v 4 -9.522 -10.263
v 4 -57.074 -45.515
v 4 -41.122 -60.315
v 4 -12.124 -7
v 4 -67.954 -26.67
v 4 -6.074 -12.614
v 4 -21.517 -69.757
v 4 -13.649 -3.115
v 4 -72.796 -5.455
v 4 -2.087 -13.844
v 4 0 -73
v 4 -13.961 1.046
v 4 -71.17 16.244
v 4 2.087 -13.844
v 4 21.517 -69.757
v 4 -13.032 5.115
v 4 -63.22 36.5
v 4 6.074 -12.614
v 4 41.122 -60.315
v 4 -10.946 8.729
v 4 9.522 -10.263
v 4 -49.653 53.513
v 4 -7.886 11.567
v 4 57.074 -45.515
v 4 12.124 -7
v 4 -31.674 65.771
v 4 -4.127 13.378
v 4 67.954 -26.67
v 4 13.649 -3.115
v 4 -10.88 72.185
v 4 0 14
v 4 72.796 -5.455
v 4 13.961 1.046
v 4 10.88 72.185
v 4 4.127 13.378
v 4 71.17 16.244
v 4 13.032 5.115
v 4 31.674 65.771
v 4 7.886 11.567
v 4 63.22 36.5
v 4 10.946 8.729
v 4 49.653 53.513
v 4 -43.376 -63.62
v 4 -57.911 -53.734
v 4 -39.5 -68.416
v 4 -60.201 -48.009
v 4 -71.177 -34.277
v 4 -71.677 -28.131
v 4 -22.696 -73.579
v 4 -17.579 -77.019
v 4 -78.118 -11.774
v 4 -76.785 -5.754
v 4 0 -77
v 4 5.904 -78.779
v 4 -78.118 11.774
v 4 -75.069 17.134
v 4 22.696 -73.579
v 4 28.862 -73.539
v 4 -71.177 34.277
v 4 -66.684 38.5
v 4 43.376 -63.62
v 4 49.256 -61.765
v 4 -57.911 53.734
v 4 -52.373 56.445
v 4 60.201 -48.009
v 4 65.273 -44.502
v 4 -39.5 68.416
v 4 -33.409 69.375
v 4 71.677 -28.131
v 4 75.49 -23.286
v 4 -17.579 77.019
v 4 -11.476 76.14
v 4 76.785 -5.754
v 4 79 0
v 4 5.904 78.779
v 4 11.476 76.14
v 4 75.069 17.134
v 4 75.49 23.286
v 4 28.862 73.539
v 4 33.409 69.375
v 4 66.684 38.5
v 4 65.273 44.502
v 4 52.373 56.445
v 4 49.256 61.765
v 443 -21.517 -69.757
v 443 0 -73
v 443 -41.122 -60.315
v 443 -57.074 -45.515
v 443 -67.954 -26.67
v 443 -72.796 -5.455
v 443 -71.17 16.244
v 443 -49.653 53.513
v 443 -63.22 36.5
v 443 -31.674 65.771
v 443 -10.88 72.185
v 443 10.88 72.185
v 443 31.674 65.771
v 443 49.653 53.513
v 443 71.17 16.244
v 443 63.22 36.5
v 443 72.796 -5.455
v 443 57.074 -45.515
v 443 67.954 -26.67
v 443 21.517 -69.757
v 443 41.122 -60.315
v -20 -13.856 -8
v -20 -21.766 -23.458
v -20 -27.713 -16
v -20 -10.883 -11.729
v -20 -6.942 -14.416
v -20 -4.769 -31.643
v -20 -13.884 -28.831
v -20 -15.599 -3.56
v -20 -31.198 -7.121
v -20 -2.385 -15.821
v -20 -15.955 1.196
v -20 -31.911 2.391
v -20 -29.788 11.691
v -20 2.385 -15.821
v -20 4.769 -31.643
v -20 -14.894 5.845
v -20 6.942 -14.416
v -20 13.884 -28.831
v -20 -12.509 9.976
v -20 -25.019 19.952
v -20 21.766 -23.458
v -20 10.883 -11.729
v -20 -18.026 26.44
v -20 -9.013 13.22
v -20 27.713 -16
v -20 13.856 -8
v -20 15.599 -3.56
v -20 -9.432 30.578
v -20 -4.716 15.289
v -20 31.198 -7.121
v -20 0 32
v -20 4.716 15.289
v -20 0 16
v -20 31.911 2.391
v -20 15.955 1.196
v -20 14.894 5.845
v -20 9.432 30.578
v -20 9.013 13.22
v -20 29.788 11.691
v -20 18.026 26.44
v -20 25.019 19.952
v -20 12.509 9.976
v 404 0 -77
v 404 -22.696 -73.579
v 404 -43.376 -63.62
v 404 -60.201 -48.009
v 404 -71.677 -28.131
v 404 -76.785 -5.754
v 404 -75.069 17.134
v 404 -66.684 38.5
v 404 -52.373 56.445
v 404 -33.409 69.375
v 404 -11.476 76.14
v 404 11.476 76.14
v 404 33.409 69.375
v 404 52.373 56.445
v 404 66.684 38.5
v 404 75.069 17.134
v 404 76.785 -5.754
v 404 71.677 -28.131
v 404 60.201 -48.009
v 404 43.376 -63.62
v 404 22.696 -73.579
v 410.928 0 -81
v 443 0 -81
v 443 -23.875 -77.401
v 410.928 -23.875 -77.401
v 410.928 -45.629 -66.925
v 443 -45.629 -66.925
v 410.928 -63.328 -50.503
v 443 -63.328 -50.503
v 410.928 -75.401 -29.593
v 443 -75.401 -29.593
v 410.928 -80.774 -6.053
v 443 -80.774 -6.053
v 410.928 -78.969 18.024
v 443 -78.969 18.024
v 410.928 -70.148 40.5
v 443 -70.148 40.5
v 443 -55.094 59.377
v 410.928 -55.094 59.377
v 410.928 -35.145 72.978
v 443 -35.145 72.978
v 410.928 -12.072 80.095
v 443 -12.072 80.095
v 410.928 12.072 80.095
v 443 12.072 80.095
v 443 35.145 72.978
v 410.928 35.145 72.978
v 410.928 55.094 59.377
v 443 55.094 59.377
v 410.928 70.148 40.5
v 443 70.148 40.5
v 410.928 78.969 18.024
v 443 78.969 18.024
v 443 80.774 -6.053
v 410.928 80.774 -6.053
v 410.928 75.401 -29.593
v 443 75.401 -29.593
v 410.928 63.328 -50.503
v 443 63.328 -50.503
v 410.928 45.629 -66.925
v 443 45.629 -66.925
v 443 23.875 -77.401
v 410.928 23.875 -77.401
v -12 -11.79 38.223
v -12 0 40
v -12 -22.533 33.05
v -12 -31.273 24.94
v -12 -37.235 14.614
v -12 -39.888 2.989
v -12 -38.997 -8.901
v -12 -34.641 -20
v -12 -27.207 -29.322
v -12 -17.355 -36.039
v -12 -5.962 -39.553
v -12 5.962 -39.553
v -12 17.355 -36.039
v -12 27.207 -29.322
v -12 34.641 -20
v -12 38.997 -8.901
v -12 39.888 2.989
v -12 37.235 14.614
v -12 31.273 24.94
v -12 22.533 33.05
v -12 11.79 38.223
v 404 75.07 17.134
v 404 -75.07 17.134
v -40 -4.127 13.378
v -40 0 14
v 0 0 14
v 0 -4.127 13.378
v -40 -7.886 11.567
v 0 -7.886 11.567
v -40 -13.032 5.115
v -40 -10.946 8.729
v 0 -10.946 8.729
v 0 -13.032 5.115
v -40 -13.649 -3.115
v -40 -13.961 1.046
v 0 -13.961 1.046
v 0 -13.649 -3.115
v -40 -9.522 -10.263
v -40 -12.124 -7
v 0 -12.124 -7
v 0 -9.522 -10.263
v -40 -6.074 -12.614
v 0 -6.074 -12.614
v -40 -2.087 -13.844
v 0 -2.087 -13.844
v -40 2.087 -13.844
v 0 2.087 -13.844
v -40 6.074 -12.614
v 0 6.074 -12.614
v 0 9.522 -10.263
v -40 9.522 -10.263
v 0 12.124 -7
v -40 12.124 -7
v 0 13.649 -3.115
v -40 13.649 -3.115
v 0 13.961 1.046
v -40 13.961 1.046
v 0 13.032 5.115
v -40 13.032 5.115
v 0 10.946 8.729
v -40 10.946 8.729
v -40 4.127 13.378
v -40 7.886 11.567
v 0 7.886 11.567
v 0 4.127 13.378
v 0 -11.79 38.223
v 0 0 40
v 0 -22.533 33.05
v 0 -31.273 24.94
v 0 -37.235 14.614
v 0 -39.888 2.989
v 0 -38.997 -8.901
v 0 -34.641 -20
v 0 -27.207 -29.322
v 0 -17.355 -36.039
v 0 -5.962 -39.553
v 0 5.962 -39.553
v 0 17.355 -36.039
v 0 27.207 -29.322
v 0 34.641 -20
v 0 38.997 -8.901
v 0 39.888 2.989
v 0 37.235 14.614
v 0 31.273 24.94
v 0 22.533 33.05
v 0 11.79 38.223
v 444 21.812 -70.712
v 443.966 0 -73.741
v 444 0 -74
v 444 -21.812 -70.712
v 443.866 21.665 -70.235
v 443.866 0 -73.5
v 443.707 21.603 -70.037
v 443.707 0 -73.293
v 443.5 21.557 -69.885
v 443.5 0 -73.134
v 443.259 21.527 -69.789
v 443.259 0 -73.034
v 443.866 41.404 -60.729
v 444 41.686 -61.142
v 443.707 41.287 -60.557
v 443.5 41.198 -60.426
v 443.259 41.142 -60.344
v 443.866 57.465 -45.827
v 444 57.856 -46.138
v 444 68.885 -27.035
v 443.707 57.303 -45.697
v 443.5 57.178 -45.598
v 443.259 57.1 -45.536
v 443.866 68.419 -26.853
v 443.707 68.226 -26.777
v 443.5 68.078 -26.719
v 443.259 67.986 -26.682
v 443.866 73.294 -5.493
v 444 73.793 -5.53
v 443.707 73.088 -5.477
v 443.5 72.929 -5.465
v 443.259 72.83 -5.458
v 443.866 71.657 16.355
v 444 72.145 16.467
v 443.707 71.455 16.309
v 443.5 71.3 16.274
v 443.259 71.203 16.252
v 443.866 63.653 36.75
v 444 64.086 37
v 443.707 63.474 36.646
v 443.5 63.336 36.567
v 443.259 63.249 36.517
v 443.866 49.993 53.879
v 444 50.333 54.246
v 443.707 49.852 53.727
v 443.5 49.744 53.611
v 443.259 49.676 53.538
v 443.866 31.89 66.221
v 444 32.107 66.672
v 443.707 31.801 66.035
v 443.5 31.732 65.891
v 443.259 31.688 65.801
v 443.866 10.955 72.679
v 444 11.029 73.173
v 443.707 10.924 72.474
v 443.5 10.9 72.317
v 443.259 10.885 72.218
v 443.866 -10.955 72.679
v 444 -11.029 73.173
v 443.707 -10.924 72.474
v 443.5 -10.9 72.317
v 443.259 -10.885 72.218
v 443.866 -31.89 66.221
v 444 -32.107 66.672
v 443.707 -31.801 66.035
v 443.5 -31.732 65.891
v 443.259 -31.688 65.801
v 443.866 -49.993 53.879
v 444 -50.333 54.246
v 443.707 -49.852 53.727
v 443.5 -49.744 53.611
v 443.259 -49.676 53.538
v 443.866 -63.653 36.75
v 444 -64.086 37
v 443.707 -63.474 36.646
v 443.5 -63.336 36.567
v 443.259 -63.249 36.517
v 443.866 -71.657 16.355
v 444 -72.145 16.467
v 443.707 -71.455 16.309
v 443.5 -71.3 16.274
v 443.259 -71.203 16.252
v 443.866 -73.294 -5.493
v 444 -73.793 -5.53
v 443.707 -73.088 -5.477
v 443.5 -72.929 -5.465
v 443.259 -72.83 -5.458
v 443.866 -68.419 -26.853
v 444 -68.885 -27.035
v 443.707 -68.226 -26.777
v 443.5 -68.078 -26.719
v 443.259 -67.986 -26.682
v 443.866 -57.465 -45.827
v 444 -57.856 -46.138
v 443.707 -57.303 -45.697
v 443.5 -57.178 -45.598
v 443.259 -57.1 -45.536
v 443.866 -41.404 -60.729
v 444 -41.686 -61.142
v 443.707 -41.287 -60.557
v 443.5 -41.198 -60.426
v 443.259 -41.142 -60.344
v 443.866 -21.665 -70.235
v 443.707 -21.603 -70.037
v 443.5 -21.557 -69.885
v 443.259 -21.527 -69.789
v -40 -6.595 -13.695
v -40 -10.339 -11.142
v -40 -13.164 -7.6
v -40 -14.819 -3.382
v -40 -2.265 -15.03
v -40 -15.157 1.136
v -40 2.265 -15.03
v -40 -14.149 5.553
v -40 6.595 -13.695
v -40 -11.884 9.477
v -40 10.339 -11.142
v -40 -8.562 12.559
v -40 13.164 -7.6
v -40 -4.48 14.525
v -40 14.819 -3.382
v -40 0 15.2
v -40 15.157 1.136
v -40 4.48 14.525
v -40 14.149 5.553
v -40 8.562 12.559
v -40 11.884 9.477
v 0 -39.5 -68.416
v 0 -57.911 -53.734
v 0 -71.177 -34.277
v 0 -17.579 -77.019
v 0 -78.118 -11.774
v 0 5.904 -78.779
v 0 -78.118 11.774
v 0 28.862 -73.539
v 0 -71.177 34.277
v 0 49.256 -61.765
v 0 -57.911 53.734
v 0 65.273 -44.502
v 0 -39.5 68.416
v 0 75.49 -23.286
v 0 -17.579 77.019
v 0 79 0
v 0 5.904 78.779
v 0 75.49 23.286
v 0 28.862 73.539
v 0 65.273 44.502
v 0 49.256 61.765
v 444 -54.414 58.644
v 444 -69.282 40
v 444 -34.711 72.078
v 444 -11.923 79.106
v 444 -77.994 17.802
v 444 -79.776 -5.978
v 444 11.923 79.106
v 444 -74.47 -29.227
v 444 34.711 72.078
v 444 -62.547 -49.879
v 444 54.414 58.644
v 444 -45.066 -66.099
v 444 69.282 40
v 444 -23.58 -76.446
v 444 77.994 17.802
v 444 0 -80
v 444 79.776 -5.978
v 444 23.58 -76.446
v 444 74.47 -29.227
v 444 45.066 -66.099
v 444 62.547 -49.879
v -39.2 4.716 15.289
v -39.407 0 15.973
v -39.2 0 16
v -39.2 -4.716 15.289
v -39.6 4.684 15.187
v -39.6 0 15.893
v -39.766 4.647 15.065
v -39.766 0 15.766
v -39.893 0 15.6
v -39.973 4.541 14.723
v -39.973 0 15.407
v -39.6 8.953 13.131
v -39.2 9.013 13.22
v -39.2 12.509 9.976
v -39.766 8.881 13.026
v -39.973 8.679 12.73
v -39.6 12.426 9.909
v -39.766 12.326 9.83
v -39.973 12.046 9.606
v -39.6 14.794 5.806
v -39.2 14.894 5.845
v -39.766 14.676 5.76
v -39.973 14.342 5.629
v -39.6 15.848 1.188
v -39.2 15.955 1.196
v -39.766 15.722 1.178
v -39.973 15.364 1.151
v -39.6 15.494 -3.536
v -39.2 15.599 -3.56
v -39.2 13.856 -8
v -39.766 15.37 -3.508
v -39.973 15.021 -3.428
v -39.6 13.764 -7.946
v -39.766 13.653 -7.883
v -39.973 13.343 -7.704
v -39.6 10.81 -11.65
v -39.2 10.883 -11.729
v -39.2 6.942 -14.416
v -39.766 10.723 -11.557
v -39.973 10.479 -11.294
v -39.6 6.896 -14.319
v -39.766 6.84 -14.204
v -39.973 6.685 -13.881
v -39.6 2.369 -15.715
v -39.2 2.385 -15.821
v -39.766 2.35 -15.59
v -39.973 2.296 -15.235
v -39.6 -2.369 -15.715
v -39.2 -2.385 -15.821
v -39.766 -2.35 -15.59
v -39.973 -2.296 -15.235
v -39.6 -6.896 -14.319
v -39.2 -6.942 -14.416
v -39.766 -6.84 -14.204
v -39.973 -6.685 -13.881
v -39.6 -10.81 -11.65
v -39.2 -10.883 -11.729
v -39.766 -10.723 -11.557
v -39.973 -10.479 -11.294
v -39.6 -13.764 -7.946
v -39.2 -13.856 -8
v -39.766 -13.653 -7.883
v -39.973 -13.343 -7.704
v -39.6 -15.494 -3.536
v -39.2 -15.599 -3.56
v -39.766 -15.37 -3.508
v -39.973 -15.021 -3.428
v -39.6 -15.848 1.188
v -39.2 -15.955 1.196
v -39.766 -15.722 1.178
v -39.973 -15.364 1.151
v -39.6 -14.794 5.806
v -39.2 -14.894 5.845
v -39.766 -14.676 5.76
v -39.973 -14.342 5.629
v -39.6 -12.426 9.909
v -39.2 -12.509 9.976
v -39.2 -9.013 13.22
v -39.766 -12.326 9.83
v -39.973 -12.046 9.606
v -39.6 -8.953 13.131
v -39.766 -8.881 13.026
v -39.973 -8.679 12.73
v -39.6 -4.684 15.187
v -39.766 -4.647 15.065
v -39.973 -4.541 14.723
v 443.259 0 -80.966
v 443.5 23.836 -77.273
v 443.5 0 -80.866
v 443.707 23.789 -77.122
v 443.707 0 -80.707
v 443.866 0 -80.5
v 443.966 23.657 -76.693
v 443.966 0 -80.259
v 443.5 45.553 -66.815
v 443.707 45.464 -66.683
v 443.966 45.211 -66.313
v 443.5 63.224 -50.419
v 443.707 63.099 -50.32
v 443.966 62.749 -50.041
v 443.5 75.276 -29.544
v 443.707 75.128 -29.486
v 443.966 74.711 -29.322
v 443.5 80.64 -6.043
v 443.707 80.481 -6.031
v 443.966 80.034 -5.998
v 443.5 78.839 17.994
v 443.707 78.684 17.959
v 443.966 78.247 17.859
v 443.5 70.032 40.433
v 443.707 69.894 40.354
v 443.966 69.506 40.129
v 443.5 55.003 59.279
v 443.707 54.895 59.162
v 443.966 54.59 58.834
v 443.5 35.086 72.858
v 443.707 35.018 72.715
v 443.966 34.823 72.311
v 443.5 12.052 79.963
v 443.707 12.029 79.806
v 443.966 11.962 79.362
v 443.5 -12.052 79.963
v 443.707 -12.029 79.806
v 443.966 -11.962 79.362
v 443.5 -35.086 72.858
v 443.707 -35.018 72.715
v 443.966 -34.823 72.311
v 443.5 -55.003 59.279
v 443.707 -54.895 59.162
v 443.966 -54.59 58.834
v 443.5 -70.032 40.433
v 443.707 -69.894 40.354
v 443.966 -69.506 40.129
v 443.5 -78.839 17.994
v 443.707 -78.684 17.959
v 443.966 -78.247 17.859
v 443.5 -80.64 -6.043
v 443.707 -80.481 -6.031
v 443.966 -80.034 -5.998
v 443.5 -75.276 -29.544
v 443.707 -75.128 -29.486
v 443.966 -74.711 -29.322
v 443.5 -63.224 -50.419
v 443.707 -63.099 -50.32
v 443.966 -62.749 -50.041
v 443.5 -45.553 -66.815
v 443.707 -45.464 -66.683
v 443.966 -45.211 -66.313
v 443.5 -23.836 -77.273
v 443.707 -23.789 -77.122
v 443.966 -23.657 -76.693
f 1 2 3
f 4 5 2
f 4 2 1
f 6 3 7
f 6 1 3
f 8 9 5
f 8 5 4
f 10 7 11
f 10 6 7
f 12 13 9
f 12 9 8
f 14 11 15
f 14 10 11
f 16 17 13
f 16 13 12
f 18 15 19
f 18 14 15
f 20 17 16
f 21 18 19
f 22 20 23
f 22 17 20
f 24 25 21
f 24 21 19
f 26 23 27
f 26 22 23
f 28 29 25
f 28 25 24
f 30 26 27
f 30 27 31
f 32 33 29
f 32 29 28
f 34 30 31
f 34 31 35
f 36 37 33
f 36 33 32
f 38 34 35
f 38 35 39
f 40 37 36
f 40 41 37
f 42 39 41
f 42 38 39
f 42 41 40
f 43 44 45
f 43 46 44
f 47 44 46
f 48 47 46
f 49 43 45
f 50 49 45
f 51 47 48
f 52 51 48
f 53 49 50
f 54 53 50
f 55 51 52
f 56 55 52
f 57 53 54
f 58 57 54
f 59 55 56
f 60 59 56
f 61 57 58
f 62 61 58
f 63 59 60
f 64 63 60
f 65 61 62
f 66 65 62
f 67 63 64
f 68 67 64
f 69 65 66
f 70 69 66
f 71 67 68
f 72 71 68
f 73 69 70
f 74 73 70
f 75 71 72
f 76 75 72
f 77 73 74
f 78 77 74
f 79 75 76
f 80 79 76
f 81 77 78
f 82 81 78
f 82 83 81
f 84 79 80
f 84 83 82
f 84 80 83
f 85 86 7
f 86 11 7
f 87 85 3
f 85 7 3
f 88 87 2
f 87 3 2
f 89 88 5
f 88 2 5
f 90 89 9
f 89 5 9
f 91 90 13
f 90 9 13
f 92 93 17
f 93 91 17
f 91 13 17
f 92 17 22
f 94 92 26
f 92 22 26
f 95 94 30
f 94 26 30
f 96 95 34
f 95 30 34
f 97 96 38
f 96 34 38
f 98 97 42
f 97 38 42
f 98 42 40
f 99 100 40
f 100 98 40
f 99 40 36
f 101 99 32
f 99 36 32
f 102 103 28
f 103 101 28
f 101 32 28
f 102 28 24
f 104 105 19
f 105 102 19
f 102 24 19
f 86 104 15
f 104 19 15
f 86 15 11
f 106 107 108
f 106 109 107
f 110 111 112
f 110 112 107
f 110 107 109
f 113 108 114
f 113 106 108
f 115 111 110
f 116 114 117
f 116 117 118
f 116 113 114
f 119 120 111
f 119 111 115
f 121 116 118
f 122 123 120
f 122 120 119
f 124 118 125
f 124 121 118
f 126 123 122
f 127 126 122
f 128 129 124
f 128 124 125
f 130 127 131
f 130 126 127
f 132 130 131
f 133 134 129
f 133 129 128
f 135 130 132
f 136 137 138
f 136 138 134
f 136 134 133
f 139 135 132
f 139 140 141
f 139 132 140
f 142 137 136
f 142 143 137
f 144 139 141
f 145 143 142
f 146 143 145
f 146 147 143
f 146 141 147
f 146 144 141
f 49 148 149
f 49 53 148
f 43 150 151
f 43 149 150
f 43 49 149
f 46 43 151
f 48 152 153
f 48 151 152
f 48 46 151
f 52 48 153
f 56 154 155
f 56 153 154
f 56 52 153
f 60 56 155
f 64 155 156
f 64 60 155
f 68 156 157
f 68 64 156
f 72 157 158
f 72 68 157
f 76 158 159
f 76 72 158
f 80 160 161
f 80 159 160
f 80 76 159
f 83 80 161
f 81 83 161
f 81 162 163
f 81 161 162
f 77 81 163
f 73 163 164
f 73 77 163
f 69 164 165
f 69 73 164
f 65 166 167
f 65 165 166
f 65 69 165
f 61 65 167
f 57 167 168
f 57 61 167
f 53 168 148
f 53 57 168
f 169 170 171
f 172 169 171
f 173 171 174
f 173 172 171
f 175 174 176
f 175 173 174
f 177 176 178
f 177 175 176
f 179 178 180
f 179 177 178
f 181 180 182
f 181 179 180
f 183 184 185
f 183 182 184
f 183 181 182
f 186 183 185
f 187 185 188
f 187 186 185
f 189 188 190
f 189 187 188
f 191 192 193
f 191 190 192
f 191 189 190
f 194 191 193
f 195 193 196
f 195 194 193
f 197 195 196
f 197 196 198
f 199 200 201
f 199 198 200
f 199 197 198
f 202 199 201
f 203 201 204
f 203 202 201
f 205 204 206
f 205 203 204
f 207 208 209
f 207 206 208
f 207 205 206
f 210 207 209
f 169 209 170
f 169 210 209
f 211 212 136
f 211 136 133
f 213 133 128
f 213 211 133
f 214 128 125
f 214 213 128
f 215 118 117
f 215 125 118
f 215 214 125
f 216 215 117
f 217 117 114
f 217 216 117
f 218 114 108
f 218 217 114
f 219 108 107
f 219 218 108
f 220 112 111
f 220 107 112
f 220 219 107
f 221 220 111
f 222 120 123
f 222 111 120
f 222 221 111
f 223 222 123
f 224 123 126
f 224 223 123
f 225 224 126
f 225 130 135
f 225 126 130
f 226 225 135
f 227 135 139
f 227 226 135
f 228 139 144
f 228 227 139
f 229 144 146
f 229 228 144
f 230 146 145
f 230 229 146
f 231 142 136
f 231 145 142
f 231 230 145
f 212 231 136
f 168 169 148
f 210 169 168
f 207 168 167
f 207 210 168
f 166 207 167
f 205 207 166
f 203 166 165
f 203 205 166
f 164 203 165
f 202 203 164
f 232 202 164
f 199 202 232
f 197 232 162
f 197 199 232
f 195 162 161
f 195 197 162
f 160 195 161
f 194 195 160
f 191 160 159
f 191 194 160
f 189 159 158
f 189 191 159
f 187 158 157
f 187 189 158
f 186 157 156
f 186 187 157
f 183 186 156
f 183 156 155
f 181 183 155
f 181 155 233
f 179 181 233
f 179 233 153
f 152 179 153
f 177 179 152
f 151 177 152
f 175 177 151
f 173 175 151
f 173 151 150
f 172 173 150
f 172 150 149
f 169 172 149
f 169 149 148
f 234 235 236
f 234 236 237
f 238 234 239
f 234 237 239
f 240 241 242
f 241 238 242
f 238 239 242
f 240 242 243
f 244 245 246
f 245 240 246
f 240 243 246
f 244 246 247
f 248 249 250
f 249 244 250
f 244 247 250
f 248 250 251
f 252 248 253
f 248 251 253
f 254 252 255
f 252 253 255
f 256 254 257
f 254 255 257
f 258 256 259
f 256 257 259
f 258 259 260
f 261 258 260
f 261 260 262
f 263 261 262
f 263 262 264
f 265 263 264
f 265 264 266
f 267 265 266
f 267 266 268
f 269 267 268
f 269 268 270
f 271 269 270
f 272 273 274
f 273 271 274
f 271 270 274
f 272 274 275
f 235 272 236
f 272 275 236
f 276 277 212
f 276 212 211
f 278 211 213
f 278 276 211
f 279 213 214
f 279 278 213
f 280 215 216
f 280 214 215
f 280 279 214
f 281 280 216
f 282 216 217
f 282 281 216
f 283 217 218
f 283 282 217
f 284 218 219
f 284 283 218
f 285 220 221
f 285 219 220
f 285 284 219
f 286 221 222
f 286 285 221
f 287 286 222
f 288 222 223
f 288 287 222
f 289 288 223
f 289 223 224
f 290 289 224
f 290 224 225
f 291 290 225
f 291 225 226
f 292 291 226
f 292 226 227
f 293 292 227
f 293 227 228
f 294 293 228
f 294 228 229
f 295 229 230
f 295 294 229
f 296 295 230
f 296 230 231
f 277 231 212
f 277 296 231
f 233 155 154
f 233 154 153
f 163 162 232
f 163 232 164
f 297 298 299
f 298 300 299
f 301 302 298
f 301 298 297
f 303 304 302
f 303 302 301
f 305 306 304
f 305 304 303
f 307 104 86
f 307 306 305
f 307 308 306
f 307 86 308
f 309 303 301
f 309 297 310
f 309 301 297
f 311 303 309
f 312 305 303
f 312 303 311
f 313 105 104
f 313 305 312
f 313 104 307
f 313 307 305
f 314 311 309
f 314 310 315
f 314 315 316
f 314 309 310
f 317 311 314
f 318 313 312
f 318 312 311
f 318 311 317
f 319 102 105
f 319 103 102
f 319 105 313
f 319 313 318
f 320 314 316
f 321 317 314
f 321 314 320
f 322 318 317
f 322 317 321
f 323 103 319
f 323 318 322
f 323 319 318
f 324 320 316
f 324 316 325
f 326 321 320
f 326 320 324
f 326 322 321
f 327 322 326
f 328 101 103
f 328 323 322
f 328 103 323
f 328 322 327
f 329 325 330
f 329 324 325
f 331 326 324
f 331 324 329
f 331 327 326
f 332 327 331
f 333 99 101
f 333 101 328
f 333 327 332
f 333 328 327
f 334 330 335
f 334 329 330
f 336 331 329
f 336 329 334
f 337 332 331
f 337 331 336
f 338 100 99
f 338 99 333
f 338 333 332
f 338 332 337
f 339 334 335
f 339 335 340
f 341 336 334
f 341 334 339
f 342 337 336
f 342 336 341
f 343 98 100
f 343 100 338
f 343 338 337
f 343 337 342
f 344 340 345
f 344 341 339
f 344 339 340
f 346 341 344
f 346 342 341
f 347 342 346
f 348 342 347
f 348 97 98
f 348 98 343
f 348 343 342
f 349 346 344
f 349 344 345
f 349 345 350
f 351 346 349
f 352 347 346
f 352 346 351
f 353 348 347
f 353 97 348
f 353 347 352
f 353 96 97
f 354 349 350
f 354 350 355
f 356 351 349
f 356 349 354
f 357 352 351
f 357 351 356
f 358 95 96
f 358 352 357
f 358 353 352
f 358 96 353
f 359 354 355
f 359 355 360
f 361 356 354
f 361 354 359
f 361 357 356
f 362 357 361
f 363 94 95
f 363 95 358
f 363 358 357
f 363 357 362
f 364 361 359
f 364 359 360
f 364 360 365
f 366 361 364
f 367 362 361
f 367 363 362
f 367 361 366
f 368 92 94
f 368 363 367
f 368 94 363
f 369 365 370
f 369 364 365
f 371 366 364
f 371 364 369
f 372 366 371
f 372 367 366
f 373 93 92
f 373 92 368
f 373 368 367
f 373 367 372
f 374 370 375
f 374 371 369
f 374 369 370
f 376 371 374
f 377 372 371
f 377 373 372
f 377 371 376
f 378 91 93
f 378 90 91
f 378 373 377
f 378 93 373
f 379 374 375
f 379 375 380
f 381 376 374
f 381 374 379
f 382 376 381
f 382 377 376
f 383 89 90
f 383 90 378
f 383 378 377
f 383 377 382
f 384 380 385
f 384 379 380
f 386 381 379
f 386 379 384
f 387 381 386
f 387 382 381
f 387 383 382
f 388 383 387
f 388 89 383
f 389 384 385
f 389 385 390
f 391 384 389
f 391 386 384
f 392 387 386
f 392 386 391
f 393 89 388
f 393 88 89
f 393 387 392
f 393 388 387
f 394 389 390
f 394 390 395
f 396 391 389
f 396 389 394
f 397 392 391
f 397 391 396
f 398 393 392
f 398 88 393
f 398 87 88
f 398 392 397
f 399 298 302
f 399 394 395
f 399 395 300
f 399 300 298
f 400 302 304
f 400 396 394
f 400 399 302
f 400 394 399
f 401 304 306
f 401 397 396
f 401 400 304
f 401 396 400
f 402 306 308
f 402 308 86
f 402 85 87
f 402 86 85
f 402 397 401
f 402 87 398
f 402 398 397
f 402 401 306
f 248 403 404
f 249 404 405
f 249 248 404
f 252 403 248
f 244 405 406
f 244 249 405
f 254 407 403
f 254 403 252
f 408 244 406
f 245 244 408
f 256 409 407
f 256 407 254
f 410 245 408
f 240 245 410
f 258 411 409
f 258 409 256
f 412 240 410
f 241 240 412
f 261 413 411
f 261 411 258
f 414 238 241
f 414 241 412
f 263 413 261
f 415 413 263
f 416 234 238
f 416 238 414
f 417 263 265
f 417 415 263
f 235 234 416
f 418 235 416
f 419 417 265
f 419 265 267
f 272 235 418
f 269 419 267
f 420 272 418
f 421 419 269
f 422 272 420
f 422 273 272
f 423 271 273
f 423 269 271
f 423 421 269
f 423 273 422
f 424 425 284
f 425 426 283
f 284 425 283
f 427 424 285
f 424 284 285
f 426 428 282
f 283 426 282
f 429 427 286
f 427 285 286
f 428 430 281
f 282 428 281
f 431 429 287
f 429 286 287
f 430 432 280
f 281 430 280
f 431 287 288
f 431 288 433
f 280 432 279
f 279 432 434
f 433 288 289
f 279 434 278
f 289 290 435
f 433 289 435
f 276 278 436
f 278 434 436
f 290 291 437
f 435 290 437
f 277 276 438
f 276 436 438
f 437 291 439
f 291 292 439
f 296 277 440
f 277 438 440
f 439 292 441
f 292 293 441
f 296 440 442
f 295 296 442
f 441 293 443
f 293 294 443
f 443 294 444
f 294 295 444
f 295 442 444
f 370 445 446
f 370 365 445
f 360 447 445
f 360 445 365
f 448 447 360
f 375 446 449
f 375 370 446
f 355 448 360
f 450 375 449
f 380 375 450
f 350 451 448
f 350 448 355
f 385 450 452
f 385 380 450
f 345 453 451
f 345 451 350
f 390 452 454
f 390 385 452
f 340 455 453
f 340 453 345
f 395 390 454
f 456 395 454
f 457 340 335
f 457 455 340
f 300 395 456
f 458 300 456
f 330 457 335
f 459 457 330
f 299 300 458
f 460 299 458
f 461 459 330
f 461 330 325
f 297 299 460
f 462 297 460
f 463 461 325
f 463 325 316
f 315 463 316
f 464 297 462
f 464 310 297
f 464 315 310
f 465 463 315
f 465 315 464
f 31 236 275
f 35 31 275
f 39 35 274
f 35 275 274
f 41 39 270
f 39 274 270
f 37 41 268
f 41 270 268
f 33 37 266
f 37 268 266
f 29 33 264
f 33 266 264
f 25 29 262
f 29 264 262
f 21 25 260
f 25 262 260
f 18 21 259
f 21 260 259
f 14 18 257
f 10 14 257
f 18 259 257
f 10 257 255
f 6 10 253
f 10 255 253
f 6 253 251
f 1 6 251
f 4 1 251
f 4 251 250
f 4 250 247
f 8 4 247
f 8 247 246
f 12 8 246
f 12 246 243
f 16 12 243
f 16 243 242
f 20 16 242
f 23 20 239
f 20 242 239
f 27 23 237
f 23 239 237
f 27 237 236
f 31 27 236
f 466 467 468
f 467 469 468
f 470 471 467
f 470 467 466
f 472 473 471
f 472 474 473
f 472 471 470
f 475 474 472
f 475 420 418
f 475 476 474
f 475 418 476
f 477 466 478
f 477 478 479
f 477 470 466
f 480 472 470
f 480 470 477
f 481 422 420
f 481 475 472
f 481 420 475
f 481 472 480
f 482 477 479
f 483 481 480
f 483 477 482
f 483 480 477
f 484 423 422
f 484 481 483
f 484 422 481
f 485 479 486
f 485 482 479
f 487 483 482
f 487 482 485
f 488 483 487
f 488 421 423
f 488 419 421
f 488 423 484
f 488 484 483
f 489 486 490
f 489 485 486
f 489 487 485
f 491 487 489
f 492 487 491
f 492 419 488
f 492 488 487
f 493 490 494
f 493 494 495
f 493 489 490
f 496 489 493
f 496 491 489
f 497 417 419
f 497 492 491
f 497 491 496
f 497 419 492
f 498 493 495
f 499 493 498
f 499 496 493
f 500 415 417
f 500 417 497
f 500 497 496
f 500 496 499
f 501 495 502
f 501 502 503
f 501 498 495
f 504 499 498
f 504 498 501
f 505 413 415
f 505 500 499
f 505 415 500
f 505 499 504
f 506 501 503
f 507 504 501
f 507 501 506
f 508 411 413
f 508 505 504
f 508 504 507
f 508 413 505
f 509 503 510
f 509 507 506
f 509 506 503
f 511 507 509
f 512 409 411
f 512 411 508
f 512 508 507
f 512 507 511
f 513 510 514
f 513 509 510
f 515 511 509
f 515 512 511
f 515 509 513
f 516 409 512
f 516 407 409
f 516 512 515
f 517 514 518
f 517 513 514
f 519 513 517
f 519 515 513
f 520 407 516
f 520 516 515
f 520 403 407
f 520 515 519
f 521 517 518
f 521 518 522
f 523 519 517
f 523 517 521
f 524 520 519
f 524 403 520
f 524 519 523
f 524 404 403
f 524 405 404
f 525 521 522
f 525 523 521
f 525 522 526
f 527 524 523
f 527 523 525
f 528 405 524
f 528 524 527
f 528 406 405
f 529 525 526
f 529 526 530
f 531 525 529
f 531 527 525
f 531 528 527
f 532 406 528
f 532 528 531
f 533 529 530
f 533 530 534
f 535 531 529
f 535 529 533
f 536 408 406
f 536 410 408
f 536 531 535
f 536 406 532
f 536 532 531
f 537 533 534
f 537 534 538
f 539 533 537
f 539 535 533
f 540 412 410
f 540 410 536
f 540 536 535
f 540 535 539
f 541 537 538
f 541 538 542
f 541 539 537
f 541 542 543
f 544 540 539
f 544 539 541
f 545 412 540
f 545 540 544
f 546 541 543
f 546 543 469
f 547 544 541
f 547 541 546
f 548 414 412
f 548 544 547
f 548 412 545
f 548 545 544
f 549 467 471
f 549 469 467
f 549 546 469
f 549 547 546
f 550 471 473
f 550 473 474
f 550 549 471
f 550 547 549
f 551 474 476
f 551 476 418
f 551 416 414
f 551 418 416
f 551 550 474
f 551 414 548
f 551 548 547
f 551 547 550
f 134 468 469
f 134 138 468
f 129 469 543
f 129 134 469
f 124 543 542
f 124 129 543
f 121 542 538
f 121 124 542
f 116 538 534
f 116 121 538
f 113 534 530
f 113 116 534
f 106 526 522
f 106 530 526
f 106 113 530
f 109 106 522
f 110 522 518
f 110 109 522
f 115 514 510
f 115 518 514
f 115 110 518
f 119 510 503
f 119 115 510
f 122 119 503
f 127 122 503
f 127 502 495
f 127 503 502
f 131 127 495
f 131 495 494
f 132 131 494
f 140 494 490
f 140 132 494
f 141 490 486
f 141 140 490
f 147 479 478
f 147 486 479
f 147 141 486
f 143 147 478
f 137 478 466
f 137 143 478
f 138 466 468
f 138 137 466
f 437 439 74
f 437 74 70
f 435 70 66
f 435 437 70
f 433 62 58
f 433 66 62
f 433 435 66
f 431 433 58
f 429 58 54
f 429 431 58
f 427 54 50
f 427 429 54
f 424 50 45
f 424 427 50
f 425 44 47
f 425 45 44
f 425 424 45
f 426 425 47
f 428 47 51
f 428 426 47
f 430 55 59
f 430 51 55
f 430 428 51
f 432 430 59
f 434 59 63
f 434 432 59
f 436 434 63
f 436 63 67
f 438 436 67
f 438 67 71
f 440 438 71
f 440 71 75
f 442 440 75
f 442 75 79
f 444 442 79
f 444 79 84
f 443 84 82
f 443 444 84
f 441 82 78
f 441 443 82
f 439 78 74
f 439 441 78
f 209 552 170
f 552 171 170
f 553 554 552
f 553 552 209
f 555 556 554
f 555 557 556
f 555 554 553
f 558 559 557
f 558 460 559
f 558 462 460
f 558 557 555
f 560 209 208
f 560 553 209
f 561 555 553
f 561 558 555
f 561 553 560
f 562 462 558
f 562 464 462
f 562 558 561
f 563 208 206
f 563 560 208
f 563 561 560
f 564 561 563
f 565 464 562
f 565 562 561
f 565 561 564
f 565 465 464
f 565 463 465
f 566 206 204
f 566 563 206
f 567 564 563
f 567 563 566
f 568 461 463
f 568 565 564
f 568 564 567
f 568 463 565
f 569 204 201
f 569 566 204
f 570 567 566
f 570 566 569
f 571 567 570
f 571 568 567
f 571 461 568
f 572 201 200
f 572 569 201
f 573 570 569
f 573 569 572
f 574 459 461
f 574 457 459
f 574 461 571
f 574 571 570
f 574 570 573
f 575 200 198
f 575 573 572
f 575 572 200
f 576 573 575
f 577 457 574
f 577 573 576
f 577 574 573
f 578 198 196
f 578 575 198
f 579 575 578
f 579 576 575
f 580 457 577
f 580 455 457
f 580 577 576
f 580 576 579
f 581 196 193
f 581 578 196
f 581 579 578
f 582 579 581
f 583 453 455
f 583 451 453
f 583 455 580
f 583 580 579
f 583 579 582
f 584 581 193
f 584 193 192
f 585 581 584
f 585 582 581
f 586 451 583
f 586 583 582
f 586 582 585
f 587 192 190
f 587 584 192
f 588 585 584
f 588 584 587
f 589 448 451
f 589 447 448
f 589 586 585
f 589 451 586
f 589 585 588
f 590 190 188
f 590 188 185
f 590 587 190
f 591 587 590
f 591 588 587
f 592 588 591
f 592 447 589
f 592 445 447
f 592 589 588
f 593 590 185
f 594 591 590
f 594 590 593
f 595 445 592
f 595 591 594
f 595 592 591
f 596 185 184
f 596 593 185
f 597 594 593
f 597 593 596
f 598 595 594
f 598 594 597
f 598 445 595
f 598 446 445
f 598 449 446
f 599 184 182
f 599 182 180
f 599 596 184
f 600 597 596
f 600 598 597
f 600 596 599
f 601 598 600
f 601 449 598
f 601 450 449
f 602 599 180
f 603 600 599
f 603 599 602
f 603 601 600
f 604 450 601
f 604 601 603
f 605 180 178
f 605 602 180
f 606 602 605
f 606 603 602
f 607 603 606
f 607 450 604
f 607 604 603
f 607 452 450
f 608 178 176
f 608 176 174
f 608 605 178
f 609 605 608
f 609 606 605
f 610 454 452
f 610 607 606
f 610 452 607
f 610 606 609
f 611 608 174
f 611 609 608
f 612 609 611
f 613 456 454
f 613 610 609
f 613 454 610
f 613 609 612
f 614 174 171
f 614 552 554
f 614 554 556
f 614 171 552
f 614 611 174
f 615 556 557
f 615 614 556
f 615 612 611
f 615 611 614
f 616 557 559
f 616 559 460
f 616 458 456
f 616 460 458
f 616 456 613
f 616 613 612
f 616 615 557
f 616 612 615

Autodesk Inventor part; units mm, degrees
ref_plane "YZ Plane" through (0, 0, 0) normal (1, 0, 0) x (0, 1, 0)
ref_plane "XZ Plane" through (0, 0, 0) normal (0, 1, 0) x (-1, 0, 0)
sketch "Sketch3" plane through (0, 0, 0) normal (1, 0, 0) x (0, 1, 0)
  circle A0 centre (0, 0) radius 79
extrude "Extrusion2" add sketch "Sketch3" along normal blind 4
sketch "Sketch4" plane through (4, 0, 0) normal (1, 0, 0) x (0, 0, -1)
  circle A0 centre (0, 0) radius 77
  circle A1 centre (0, 0) radius 73
extrude "Extrusion3" add sketch "Sketch4" along normal blind 400
ref_plane "Work Plane1" through (404, 0, 0) normal (1, 0, 0) x (0, 0, -1)
sketch "Sketch5" plane through (404, 0, 0) normal (1, 0, 0) x (0, 0, -1)
  circle A0 centre (0, 0) radius 81
  circle A1 centre (0, 0) radius 73
extrude "Extrusion4" add sketch "Sketch5" along normal blind 40
chamfer "Chamfer1" distance 4 angle 60 1 edges at (404, 0, 81) measured on face at (404, 0, 78.1669)
sketch "Sketch7" plane through (0, 0, 0) normal (-1, 0, 0) x (0, 0, 1)
  circle A0 centre (0, 0) radius 16
  circle A1 centre (0, 0) radius 40
  circle A2 centre (0, 0) radius 14
extrude "Extrusion5" add sketch "Sketch7" along normal blind 20 contours A1
extrude "Extrusion6" add sketch "Sketch7" along normal blind 40 contours A0
fillet "Fillet1" radius 0.8 1 edges at (-40, 0, -16)
chamfer "Chamfer2" distance 8 angle 45 1 edges at (-20, 0, -40)
fillet "Fillet2" radius 1 2 edges at (444, 0, 81) (444, 0, 73)
extrude "Extrusion7" cut sketch "Sketch7" against normal through all contours A2
sketch "Sketch8" plane through (0, 0, 0) normal (-1, 0, 0) x (0, 0, 1)
  point P0 (0, 0)
properties part number "GuiderTube"
